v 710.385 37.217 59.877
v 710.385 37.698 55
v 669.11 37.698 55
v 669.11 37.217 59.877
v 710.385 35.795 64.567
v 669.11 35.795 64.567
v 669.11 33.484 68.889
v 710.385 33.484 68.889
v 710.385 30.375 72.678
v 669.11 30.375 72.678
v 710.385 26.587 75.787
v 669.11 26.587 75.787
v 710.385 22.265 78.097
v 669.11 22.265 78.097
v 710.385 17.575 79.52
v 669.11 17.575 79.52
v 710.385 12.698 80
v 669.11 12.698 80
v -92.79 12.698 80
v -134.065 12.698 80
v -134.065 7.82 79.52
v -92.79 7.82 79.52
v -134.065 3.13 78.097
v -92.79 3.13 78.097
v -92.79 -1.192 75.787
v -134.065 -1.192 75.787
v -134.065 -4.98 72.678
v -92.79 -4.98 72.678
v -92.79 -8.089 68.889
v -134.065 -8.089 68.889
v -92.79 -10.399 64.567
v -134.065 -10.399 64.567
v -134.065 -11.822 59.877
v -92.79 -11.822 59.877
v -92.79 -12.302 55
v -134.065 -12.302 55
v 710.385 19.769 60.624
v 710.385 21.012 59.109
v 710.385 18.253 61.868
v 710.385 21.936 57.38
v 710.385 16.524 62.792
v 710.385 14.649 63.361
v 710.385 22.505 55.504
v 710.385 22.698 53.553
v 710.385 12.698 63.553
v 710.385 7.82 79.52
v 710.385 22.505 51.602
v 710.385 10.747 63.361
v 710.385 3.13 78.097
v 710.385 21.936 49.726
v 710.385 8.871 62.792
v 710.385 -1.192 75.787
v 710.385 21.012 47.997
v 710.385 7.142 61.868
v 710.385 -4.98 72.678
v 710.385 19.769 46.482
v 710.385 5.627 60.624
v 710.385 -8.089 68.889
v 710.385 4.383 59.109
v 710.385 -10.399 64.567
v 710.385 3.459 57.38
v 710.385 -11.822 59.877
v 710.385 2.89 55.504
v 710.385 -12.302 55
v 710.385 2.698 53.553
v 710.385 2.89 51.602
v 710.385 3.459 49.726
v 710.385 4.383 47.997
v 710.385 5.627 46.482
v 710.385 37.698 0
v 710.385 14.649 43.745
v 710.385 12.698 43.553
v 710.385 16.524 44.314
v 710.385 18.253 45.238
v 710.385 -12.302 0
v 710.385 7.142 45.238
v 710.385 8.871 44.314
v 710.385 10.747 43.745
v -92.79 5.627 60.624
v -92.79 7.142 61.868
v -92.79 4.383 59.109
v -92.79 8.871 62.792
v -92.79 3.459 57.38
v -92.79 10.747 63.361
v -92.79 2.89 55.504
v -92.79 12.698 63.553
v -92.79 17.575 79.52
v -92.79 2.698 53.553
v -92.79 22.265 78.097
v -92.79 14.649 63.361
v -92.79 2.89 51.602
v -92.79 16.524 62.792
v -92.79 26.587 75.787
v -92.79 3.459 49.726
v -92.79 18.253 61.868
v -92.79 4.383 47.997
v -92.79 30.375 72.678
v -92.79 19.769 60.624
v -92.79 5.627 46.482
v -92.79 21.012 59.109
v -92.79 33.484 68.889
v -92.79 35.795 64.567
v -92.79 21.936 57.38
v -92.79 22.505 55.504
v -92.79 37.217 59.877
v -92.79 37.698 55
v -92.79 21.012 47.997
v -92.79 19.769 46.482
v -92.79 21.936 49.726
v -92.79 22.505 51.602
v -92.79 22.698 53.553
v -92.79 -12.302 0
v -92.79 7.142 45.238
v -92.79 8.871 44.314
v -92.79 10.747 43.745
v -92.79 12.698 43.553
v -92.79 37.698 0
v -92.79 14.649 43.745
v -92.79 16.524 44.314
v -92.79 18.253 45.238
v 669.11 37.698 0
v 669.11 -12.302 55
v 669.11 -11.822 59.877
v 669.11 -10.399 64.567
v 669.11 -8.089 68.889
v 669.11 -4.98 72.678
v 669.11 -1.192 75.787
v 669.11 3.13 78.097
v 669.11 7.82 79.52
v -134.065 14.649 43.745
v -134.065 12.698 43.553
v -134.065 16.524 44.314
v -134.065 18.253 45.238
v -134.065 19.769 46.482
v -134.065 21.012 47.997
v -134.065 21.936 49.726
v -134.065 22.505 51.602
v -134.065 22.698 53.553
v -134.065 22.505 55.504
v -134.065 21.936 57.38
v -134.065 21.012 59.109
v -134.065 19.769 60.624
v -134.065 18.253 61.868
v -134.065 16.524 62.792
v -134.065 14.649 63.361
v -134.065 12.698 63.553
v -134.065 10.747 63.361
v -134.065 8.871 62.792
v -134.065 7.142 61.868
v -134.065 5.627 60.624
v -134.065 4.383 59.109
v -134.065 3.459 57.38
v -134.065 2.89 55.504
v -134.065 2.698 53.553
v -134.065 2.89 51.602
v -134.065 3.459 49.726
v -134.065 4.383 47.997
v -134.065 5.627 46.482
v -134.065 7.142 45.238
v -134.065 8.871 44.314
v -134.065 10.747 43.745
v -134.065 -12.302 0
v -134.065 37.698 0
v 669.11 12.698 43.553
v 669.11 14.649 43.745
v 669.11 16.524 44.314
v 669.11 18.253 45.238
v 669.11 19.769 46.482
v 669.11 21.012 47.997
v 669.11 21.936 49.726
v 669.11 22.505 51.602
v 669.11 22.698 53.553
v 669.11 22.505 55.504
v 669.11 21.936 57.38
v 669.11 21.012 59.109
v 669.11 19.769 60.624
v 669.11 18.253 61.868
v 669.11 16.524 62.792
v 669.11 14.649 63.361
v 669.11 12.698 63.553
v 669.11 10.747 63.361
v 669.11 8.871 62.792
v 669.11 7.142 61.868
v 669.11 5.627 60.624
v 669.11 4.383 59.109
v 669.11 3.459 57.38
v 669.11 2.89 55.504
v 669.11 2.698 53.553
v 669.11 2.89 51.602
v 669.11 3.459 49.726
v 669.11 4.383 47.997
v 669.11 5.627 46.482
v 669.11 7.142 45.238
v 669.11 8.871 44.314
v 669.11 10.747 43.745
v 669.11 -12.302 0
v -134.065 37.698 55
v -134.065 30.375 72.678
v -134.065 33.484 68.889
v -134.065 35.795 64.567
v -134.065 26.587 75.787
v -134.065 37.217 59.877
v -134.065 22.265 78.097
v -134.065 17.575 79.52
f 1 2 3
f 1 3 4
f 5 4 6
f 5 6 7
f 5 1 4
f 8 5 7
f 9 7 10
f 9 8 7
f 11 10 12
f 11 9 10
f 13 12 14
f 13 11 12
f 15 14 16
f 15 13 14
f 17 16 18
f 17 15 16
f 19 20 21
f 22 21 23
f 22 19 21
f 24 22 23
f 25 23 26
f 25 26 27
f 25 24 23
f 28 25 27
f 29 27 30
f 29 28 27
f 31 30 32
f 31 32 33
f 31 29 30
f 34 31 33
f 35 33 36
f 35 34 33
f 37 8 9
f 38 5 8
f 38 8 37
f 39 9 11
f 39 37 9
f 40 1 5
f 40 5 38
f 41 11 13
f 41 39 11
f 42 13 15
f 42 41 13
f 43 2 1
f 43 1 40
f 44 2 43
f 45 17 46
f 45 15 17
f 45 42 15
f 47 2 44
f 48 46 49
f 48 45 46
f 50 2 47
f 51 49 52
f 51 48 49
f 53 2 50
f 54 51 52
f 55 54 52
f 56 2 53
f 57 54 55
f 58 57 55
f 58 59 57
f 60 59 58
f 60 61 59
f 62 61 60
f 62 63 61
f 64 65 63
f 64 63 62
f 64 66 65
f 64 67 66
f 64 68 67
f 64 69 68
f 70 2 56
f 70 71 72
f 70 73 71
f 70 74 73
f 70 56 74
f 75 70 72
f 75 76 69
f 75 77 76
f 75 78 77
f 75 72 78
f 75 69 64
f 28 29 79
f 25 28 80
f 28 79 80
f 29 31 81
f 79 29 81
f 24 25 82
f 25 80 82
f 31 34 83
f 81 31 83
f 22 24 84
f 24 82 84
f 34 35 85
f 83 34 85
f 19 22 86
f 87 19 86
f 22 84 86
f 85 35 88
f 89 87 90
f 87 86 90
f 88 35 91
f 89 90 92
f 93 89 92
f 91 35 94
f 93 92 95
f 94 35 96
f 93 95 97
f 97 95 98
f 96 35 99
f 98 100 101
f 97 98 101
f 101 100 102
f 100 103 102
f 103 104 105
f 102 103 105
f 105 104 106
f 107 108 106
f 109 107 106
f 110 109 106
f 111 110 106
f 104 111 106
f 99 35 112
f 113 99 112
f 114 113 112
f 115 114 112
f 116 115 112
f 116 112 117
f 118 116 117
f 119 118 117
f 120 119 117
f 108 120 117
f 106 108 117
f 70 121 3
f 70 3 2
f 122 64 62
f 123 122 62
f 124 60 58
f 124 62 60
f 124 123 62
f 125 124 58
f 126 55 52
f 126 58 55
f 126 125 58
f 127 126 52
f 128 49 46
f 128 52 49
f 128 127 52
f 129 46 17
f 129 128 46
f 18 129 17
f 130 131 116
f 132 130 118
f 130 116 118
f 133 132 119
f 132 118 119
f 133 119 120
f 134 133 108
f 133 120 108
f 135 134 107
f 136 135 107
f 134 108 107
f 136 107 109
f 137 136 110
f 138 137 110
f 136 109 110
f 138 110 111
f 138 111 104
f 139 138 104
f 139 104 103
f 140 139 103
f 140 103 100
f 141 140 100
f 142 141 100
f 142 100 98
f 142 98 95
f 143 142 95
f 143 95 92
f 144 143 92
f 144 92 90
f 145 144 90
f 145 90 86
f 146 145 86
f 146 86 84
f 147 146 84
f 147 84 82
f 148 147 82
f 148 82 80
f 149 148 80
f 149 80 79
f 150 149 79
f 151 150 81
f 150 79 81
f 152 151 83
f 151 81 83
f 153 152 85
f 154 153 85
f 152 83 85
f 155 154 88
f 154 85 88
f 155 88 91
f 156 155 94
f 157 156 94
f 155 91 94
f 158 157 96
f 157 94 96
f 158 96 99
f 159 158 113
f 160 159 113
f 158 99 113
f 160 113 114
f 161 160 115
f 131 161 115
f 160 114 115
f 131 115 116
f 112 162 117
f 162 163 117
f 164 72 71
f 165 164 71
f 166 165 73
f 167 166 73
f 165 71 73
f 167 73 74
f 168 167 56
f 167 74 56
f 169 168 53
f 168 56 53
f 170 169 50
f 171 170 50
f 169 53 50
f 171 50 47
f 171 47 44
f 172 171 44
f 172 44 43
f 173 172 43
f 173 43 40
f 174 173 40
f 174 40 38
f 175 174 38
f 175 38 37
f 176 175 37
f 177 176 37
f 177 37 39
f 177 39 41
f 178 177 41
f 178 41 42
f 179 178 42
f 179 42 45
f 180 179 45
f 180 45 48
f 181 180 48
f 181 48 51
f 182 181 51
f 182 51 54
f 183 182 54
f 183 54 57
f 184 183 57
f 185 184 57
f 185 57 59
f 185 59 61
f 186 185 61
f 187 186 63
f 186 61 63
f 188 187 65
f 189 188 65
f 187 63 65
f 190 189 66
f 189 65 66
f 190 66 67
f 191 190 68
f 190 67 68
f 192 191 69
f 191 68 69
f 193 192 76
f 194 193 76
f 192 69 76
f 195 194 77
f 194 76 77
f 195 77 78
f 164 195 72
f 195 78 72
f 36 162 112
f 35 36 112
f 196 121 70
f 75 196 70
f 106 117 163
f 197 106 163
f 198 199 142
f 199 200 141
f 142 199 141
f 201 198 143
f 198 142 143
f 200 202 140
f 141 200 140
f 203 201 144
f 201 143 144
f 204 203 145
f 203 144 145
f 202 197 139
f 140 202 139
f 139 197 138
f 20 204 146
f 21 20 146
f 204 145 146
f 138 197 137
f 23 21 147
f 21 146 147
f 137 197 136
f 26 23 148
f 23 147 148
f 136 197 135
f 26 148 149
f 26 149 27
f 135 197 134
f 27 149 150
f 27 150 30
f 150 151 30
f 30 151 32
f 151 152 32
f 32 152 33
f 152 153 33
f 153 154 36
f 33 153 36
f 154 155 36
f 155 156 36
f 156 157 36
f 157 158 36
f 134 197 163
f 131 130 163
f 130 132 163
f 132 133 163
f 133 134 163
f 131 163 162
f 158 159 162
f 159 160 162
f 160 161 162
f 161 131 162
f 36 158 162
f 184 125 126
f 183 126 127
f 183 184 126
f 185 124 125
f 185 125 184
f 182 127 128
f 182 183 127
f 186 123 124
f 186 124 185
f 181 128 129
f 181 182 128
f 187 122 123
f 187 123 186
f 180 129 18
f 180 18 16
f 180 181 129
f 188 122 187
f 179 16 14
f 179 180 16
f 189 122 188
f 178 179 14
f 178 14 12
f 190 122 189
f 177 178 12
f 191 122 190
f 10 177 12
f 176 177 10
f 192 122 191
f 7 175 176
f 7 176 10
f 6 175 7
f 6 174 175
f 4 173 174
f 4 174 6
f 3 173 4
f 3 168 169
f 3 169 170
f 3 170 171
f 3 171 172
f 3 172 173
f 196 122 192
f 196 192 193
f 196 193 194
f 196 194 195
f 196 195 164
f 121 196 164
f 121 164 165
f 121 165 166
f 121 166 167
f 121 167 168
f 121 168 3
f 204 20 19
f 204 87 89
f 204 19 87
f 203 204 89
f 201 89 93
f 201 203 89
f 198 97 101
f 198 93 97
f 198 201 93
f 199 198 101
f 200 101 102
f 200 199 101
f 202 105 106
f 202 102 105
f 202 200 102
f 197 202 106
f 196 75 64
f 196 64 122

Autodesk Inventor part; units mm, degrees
ref_plane "YZ Plane" through (0, 0, 0) normal (1, 0, 0) x (0, 1, 0)
ref_plane "XZ Plane" through (0, 0, 0) normal (0, 1, 0) x (-1, 0, 0)
ref_plane "XY Plane" through (0, 0, 0) normal (0, 0, 1) x (1, 0, 0)
ref_plane "Work Plane1" through (0, 0, 0) normal (0, 0, 1) x (1, 0, 0)
sketch "Sketch1" plane through (0, 0, 0) normal (0, 0, 1) x (1, 0, 0)
  line L0 (-134.0646, -12.3024) -> (-92.7896, -12.3024)
  line L1 (-92.7896, -12.3024) -> (-92.7896, 37.6976)
  line L2 (-92.7896, 37.6976) -> (-134.0646, 37.6976)
  line L3 (-134.0646, 37.6976) -> (-134.0646, -12.3024)
  line L4 (710.3854, 1102.2976) -> (710.3854, -142.1524) projected
  line L5 (707.2104, -138.9774) -> (-130.8896, -138.9774) projected
  line L6 (288.1604, -138.9774) -> (288.1604, 728.5141) construction
  line L7 (710.3854, -12.3024) -> (669.1104, -12.3024)
  line L8 (669.1104, -12.3024) -> (669.1104, 37.6976)
  line L9 (669.1104, 37.6976) -> (710.3854, 37.6976)
  line L10 (710.3854, 37.6976) -> (710.3854, -12.3024)
  point P0 (0, 0)
extrude "Extrusion1" add sketch "Sketch1" along normal blind 80
sketch "Sketch2" plane through (710.3854, -12.3024, 0) normal (1, 0, 0) x (0, 0, -1)
  circle A0 centre (-53.553, 25) radius 10
  line L0 (0, 50) -> (-80, 50) projected
  point P0 (0, 12.3024)
  dimension "d2" = 25
  dimension "d3" = 20
extrude "Extrusion2" cut sketch "Sketch2" against normal through all
fillet "Fillet1" radius 25 4 edges at (689.7479, -12.3024, 80) (689.7479, 37.6976, 80) (-113.4271, -12.3024, 80) (-113.4271, 37.6976, 80)
properties part number "BEVEL_SHAFT"
